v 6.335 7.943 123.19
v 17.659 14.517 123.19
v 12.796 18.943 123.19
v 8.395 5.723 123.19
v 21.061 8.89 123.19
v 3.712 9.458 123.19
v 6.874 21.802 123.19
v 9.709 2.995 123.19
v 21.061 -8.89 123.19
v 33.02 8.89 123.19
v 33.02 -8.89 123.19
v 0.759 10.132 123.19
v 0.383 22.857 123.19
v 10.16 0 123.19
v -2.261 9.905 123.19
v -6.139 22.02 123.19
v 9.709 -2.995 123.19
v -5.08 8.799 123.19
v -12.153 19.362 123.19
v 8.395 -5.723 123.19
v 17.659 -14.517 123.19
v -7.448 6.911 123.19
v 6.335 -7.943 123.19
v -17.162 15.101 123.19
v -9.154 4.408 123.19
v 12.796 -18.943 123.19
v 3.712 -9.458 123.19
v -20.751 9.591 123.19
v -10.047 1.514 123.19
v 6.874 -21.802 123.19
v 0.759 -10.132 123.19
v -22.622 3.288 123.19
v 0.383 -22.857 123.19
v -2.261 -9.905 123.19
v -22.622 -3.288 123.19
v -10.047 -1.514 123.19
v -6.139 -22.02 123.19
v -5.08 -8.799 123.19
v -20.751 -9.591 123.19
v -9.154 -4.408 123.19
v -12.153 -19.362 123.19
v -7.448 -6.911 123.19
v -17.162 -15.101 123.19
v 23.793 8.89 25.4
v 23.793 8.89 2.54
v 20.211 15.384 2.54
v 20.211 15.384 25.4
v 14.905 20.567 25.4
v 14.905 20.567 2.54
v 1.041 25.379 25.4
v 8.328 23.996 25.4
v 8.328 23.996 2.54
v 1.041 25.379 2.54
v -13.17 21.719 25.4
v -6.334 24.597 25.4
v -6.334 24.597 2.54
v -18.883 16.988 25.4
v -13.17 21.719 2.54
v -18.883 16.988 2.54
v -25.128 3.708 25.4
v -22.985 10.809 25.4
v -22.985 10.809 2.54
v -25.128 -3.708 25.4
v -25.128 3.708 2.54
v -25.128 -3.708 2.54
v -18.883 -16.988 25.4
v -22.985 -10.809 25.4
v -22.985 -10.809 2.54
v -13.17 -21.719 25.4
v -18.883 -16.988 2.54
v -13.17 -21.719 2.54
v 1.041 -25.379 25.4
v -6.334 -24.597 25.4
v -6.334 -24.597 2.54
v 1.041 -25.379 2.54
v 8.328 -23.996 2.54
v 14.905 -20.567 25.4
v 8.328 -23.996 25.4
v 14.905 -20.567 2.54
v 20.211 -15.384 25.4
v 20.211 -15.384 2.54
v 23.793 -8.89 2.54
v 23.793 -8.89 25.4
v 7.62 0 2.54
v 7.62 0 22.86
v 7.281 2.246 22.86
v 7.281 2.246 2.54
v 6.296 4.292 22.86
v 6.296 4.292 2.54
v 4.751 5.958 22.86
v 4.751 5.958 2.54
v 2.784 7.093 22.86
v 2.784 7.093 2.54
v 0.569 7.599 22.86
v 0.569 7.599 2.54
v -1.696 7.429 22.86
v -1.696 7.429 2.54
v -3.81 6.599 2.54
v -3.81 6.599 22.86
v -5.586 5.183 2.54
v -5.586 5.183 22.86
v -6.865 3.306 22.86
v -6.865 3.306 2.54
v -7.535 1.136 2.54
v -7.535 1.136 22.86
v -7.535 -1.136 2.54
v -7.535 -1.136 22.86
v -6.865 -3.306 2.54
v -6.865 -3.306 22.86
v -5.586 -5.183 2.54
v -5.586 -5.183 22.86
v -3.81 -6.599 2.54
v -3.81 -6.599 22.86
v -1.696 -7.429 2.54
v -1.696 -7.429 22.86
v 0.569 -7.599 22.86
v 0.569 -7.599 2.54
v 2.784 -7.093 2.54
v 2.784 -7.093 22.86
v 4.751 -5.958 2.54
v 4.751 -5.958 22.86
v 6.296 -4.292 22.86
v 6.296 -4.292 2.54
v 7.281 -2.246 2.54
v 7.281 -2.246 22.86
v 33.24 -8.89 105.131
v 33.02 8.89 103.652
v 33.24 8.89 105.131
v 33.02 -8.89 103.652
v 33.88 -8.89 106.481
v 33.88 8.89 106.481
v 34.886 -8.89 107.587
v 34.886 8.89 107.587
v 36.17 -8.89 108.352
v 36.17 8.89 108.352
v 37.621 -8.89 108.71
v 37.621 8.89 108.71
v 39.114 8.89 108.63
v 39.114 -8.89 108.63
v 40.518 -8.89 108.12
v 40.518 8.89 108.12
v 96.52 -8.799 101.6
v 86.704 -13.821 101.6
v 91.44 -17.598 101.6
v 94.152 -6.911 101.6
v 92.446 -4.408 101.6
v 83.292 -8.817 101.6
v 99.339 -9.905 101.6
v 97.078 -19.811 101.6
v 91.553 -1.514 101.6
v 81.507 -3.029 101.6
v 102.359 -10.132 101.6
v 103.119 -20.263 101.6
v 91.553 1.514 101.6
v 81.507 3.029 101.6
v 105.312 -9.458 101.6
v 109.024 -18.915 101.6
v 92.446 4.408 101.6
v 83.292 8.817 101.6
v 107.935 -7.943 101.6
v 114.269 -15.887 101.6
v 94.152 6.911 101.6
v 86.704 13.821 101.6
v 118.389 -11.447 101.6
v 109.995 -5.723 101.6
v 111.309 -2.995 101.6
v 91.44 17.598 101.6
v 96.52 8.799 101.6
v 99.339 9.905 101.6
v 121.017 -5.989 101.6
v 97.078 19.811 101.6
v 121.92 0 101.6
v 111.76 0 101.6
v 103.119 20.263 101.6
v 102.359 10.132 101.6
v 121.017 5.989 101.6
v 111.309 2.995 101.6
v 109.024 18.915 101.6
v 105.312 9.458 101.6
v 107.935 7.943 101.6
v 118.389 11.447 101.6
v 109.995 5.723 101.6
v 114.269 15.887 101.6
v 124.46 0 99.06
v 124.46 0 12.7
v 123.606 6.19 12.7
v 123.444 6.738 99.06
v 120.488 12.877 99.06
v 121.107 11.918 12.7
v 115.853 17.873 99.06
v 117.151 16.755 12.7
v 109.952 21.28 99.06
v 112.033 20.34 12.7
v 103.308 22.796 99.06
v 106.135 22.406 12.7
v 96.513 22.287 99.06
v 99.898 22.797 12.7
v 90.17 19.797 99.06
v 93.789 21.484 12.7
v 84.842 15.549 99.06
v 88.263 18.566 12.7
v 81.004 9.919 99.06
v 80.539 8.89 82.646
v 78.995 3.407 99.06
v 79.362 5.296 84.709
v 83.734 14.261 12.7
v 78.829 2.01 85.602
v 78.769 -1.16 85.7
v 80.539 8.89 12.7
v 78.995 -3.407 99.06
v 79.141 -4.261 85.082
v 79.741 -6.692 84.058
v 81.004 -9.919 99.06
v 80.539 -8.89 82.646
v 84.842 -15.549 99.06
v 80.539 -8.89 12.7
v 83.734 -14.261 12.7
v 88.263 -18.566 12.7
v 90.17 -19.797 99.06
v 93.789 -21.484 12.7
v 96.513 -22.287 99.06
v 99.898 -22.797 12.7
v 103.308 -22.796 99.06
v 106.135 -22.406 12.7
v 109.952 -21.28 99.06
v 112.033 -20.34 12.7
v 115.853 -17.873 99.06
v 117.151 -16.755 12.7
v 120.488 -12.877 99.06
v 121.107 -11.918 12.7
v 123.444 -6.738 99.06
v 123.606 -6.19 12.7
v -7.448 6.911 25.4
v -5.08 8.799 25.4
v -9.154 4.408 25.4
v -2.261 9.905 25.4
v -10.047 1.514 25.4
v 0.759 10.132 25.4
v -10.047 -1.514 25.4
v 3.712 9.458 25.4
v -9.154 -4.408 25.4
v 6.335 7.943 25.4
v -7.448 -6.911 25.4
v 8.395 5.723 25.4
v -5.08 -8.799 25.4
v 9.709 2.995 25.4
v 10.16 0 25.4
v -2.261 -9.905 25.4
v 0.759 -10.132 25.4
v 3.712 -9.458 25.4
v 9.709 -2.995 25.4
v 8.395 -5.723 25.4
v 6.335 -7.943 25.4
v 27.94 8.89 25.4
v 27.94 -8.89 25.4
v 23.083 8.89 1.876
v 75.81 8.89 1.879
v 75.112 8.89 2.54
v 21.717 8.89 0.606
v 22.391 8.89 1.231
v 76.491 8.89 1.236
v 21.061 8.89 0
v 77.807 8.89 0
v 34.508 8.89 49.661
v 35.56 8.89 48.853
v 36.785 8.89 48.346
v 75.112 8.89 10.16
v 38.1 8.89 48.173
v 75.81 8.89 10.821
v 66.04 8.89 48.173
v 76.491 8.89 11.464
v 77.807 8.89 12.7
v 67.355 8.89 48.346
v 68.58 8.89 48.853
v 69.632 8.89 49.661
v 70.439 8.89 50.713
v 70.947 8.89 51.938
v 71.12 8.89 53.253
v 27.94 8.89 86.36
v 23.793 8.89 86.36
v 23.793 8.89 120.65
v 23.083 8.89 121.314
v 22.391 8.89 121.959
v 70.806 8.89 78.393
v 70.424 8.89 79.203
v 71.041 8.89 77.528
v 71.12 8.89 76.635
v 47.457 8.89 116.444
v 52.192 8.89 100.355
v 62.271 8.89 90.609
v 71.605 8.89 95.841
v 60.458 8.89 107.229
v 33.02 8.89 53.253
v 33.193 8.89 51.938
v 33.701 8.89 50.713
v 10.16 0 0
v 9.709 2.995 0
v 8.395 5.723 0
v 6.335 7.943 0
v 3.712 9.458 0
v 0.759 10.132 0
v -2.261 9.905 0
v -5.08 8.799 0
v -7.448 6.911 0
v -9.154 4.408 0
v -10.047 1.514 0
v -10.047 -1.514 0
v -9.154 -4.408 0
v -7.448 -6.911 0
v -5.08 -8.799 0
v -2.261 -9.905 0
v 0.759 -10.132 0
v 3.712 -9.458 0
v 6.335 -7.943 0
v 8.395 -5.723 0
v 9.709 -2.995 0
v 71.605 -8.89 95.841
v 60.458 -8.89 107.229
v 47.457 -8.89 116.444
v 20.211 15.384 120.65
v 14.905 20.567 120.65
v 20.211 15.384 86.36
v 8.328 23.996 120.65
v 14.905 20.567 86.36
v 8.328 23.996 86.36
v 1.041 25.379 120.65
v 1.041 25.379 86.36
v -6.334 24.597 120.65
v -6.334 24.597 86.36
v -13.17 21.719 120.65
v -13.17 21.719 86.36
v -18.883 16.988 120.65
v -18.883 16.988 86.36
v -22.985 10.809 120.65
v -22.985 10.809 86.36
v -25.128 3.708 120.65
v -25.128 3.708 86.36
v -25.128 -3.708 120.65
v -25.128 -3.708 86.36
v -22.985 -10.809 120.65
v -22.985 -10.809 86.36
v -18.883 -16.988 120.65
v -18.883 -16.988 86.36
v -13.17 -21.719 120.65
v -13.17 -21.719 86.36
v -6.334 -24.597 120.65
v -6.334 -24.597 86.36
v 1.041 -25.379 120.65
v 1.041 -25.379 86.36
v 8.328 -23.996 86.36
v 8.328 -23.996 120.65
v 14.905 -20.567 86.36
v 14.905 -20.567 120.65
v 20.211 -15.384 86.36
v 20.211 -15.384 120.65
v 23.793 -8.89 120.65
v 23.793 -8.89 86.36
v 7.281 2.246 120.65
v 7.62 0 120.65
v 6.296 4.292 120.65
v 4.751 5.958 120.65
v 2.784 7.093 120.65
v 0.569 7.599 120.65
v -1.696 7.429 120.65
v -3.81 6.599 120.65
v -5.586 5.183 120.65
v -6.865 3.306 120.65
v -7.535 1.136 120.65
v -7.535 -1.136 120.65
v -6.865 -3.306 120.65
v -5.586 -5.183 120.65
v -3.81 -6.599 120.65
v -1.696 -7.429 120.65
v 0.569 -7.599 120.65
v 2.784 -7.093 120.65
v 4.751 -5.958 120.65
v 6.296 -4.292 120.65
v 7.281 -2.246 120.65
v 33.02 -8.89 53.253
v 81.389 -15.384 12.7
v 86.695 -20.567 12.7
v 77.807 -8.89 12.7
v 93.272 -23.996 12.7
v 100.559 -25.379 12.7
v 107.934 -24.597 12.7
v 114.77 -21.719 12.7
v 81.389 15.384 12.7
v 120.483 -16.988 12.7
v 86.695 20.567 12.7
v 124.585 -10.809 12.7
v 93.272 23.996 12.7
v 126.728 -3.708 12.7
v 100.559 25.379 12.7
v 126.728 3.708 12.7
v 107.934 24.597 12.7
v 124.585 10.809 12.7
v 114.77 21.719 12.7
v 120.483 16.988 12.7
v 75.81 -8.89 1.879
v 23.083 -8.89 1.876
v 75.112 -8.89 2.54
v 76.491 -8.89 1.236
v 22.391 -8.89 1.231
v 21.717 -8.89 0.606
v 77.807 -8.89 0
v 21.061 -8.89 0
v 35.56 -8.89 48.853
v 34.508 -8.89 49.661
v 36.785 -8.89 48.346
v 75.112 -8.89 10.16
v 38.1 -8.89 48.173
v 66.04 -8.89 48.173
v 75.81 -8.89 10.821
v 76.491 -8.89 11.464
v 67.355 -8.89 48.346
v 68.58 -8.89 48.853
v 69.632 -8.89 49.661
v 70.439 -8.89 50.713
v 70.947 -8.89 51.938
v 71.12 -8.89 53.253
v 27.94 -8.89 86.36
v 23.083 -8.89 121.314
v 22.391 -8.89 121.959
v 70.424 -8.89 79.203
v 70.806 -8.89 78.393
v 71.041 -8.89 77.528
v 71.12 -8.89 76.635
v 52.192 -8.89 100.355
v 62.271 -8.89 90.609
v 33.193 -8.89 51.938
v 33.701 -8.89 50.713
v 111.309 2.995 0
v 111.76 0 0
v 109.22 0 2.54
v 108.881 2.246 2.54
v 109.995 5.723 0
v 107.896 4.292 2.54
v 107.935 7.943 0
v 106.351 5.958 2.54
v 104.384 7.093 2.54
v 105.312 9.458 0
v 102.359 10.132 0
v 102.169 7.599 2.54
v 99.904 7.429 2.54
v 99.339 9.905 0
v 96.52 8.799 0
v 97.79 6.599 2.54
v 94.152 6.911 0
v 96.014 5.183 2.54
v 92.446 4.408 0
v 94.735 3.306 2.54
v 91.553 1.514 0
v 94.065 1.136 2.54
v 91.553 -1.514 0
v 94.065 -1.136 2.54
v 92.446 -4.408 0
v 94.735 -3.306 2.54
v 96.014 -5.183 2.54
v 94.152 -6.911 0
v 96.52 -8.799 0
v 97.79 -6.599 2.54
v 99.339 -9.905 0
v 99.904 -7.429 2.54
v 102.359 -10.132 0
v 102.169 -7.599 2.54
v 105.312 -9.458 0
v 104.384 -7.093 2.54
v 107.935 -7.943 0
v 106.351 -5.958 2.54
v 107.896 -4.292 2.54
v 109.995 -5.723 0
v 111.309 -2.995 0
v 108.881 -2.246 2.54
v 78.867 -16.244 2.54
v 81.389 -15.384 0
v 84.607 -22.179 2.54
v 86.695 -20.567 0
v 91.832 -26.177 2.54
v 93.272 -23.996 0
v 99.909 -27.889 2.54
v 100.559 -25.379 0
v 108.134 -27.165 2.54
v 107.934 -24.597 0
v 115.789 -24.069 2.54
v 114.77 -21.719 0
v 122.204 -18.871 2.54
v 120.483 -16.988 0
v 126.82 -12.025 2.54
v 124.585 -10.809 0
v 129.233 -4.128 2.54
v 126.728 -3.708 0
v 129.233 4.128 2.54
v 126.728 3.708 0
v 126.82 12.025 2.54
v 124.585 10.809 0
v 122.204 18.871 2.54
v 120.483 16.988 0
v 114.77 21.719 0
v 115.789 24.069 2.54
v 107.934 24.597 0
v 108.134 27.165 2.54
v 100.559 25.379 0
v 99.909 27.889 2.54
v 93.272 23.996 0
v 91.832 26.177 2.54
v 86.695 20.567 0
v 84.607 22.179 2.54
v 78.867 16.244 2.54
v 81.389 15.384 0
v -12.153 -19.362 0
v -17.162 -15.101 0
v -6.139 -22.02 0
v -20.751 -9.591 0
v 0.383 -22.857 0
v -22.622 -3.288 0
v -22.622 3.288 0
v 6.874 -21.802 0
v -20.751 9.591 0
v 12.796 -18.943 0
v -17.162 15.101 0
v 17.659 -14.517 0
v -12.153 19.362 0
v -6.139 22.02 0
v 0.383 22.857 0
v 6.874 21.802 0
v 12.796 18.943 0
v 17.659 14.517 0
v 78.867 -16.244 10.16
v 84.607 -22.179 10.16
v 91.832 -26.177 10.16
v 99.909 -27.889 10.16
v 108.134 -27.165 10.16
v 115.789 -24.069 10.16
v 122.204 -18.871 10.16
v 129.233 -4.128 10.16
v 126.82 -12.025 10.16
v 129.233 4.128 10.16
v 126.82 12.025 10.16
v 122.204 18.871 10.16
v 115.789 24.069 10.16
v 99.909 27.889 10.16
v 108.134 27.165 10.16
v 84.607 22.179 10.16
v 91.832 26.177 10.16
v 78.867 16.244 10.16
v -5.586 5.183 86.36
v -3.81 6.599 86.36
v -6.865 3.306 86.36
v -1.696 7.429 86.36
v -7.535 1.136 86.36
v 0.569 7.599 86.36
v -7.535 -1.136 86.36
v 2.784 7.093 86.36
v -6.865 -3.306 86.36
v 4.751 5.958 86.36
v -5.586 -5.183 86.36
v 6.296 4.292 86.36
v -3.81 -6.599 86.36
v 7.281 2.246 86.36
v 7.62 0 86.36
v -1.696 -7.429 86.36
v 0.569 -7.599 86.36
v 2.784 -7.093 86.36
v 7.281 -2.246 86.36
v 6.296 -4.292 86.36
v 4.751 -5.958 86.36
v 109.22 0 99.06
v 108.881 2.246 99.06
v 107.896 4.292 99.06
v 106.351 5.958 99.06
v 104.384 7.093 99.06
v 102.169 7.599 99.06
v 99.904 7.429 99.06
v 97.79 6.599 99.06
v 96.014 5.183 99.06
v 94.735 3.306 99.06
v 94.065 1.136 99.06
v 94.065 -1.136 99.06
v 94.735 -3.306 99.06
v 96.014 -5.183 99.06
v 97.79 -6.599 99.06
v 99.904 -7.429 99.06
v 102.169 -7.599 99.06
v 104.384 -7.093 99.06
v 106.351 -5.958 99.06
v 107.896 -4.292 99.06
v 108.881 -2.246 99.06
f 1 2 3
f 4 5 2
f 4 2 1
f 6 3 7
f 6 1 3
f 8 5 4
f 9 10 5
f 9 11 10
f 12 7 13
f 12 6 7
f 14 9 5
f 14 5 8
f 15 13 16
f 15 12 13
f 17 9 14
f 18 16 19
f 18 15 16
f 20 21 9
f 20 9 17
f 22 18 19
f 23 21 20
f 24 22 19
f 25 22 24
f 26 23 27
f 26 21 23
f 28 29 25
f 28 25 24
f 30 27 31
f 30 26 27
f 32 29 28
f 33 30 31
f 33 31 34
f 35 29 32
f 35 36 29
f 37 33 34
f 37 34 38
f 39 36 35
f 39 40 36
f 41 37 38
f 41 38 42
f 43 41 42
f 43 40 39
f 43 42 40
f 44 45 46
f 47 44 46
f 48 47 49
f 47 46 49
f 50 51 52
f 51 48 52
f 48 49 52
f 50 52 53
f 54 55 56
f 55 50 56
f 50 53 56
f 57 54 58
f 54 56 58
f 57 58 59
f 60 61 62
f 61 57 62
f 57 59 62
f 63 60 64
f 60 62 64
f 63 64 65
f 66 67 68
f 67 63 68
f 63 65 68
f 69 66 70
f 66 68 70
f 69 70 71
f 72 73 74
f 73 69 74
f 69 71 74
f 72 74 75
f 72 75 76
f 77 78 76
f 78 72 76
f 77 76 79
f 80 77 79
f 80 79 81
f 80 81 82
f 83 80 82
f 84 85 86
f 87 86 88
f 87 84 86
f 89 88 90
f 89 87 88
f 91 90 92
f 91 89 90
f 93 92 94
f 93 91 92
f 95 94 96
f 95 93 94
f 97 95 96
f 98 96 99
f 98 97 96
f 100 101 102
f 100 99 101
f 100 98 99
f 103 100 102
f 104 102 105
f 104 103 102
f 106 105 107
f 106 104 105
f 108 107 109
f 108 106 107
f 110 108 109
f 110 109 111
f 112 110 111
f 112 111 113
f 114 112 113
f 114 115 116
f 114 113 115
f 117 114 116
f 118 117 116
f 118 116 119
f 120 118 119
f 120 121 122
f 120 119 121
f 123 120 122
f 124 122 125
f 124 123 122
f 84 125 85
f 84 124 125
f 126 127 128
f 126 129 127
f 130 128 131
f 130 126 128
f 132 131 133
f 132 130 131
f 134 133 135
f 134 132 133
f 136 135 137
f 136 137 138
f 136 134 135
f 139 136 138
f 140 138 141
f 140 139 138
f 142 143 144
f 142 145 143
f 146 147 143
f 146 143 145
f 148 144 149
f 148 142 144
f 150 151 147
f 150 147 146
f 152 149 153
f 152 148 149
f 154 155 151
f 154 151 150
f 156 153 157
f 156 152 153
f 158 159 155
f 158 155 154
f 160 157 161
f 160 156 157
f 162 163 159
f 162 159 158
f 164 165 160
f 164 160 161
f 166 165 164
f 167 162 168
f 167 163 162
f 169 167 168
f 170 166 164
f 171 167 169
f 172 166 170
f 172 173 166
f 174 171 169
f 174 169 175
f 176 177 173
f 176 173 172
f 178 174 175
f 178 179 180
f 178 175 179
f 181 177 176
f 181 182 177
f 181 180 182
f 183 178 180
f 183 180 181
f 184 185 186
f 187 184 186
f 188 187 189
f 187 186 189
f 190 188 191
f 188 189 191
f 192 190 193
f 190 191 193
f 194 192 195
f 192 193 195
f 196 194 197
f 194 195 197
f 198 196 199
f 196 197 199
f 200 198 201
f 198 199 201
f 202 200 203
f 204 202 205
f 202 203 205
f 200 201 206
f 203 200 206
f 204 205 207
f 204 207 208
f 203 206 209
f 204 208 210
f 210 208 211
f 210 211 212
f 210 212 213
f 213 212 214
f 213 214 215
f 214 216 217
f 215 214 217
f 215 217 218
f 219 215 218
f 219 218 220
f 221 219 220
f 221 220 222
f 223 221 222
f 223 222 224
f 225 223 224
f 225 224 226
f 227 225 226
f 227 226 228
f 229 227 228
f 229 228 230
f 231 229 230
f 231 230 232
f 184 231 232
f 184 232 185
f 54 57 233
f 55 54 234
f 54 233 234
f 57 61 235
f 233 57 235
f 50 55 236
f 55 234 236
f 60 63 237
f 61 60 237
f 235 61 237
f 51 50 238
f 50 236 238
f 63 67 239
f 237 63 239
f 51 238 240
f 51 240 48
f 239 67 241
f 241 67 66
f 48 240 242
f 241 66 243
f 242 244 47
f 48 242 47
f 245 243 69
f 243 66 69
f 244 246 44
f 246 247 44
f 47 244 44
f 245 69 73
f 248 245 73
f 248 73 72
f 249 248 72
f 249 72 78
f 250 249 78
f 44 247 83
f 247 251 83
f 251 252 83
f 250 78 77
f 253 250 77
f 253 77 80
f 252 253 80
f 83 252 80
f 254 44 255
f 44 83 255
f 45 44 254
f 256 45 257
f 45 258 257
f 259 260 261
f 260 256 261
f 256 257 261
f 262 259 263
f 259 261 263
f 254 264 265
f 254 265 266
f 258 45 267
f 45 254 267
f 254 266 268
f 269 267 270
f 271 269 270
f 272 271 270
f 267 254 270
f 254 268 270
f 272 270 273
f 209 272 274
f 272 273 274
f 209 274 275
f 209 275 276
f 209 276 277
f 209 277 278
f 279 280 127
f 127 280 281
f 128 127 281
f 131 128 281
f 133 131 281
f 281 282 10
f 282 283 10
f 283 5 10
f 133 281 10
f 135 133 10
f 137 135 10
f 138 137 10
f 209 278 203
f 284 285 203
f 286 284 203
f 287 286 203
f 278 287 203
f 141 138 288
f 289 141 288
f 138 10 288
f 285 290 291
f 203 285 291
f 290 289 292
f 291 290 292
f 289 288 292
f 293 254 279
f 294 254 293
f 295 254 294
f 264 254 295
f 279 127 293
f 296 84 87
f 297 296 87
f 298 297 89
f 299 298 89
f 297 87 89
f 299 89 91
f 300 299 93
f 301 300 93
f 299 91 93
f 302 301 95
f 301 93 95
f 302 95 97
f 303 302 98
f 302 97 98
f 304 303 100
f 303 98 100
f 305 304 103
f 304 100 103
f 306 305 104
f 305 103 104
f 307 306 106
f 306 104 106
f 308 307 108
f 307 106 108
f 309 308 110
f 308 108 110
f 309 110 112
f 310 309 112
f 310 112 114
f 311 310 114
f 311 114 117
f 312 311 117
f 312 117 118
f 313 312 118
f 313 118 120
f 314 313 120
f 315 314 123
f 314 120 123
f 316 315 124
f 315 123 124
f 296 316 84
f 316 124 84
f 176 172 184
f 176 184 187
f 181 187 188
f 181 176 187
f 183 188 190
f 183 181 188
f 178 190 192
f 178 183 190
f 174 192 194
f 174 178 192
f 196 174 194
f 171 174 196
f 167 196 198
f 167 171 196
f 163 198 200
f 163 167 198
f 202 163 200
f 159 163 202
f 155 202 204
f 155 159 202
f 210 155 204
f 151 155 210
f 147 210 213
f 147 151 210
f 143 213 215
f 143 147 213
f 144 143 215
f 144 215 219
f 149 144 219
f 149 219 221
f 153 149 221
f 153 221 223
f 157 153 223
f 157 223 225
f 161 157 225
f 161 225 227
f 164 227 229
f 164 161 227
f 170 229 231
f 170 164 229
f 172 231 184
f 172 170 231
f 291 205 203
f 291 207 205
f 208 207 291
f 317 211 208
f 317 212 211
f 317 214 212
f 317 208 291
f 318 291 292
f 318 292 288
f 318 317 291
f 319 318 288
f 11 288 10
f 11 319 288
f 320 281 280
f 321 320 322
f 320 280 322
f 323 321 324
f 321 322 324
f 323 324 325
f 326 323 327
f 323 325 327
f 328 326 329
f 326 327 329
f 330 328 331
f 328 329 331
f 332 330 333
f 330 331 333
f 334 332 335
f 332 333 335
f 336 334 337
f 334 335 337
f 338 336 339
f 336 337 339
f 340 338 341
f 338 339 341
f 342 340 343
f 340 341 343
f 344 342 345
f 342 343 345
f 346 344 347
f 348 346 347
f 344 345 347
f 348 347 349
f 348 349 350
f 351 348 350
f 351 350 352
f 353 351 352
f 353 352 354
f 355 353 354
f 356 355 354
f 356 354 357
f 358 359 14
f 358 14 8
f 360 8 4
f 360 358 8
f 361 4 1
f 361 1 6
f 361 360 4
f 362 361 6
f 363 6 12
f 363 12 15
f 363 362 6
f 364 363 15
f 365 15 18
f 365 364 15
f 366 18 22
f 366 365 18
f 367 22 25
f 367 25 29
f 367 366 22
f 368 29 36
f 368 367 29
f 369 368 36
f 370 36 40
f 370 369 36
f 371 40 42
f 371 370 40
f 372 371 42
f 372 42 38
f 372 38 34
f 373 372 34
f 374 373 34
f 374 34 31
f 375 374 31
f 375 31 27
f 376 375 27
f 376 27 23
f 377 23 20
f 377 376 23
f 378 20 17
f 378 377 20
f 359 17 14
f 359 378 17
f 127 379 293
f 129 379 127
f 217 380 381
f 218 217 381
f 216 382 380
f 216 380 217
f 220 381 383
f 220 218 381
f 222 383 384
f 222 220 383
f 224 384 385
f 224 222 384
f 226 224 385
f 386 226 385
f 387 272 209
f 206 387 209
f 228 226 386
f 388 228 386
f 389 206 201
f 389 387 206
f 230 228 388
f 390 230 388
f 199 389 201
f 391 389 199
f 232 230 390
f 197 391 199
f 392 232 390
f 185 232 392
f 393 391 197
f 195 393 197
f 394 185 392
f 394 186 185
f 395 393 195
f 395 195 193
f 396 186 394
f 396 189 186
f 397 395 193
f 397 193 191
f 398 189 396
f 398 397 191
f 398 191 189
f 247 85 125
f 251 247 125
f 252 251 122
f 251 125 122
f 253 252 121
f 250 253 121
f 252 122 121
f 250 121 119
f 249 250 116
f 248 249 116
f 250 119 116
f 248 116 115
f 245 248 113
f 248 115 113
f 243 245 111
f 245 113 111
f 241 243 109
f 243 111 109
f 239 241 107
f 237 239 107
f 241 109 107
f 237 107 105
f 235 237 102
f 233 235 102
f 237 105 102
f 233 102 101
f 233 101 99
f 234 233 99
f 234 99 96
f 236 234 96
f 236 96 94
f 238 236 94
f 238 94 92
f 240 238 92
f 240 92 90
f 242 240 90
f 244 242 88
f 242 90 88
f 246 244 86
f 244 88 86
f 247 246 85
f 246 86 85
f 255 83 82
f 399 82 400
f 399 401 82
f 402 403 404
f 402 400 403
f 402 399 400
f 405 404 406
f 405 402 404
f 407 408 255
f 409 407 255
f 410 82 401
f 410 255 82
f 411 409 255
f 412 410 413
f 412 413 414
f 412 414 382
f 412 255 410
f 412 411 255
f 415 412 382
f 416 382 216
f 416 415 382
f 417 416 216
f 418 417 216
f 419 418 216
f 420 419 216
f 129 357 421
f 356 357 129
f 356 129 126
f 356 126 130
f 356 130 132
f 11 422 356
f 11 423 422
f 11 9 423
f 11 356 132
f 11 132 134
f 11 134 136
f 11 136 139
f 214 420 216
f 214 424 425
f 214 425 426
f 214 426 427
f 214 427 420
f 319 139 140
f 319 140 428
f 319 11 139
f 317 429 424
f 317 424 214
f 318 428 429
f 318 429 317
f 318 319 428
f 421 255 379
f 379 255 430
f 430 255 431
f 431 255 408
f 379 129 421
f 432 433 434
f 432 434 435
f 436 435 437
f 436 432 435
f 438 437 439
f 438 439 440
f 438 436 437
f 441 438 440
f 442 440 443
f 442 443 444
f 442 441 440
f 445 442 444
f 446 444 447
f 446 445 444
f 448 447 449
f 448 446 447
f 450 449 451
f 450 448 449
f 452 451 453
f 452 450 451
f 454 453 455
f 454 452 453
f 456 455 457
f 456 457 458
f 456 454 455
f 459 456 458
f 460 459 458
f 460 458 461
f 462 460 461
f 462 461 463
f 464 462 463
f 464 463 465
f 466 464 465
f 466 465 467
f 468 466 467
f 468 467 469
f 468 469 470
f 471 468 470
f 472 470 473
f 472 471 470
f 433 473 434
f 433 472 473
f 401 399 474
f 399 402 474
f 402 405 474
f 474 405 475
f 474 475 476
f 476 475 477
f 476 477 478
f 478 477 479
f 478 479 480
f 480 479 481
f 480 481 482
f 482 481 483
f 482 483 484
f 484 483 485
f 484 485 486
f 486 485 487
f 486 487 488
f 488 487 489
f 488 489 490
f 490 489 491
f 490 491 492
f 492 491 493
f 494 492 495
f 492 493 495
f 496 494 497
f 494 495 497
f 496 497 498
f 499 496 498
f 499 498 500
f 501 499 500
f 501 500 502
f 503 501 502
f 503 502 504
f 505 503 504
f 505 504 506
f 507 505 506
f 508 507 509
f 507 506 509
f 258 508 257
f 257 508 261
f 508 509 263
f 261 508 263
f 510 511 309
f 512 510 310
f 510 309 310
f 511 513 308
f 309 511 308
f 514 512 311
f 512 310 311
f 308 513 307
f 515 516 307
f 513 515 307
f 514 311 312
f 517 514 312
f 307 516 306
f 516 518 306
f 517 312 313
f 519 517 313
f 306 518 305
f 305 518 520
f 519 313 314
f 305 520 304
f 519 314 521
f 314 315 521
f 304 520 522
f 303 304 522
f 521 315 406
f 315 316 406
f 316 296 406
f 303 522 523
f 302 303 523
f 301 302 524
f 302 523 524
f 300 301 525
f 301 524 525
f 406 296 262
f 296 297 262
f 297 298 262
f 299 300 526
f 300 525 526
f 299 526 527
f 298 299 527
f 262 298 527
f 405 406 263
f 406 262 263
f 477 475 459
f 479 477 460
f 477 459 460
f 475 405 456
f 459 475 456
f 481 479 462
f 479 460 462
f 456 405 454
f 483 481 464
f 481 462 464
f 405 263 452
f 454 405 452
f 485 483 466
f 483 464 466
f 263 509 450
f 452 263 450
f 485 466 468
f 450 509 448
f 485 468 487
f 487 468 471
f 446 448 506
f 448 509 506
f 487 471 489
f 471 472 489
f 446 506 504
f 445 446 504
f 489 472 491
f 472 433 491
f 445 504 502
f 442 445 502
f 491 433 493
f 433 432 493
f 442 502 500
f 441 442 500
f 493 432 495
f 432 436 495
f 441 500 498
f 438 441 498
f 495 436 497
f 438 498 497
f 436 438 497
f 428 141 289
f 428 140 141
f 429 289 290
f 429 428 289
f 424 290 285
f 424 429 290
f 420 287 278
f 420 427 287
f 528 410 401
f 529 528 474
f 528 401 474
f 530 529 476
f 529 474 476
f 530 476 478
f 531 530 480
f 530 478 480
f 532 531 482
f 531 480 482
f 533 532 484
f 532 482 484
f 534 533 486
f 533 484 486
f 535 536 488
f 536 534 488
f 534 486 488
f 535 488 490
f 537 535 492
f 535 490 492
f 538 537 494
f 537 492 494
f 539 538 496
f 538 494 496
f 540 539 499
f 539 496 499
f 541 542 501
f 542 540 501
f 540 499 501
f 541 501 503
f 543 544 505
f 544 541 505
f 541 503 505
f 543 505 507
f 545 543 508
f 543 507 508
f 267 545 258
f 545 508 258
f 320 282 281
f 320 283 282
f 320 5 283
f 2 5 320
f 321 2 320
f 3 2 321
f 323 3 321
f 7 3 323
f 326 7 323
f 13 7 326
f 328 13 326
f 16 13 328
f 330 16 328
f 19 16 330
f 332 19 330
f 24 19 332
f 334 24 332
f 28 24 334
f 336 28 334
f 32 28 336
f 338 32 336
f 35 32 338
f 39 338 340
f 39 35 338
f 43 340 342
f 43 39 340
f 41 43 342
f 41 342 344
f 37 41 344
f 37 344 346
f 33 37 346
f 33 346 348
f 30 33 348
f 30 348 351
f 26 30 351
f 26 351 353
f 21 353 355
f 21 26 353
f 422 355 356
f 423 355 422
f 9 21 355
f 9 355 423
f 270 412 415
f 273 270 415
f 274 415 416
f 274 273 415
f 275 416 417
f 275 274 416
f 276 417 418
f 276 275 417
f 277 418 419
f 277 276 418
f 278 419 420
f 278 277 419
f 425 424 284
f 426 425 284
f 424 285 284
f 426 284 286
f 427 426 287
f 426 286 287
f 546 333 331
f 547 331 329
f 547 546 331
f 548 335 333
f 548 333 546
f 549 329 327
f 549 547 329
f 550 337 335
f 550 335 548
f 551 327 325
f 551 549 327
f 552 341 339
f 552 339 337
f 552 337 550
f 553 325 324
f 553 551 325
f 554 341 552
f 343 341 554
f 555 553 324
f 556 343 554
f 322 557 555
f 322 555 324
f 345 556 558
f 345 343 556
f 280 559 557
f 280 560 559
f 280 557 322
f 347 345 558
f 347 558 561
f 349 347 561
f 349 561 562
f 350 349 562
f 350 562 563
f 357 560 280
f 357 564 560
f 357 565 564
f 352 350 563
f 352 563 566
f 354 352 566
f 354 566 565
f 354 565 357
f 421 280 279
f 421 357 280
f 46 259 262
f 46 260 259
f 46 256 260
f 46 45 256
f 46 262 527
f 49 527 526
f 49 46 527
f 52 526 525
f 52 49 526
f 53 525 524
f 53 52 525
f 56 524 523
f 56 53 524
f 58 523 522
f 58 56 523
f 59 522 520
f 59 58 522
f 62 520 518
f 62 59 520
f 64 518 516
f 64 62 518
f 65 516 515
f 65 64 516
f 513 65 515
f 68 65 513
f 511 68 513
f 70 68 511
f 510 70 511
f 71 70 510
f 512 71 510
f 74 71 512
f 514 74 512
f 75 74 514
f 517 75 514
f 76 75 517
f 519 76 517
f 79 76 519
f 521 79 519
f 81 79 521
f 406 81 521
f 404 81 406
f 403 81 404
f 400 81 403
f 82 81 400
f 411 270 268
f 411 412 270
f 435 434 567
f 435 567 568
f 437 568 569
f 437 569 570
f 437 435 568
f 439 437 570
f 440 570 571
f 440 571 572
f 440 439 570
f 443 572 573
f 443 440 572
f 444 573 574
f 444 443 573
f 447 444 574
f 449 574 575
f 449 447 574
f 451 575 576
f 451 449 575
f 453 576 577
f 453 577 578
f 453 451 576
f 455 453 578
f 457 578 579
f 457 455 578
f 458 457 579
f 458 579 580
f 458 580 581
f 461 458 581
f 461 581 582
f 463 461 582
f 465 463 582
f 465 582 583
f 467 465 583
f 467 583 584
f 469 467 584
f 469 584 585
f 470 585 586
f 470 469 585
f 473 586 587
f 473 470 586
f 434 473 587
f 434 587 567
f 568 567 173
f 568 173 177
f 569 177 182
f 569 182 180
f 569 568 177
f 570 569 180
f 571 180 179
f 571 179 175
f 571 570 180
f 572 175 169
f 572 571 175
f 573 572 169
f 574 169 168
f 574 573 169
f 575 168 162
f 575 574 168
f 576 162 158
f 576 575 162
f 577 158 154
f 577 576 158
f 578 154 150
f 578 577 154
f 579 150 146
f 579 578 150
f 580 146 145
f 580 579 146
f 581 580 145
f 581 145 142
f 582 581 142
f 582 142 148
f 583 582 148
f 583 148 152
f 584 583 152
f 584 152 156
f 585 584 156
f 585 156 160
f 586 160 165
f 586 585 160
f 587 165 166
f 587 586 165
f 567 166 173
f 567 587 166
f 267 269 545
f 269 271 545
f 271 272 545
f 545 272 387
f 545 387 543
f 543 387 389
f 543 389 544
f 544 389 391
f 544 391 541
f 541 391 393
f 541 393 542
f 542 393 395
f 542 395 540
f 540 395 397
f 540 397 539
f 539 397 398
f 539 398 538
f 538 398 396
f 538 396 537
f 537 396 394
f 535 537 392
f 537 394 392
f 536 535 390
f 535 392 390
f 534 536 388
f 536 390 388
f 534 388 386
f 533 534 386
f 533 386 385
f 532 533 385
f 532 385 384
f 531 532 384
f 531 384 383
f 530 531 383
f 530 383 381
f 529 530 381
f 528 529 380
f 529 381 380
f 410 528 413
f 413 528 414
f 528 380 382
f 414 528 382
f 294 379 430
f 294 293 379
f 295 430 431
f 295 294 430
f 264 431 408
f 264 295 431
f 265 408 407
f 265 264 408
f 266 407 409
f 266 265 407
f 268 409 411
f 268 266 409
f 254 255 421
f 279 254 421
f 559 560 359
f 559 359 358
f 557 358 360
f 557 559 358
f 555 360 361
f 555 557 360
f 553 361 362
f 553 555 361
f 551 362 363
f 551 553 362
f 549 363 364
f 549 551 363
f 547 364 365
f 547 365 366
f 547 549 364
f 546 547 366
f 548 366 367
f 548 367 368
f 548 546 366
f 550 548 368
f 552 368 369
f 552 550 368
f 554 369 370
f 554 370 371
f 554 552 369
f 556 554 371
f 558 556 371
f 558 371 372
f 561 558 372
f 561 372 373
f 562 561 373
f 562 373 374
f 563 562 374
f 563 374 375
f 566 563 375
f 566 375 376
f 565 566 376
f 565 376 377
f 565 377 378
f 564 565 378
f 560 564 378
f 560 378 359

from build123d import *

# Parameters (mm, degrees)
F0_R      = 25.4
F0_R_2    = 7.62
F1_DEPTH  = 123.19
F0_R_3    = 22.86
F3_DEPTH  = 101.6
F5_DEPTH  = 8.89
F6_W      = 60.96
F6_H      = 60.96
F7_DEPTH  = 50.8
F8_R      = 5.08
F9_SIZE   = 2.54
F10_R     = 27.94
F10_R_2   = 22.86
F11_DEPTH = 12.7
F12_SIZE  = 2.54


with BuildPart() as f1:
    # F0 (on Top) → F1 (new body)
    with BuildSketch(Plane.XY):
        Circle(F0_R)
        Circle(F0_R_2, mode=Mode.SUBTRACT)
    extrude(amount=F1_DEPTH)



with BuildPart() as f3:
    # F0 (on Top) → F3 (new body)
    with BuildSketch(Plane.XY):
        with Locations((101.6, 0)):
            Circle(F0_R_3)
        with Locations((101.6, 0)):
            Circle(F0_R_2, mode=Mode.SUBTRACT)
    extrude(amount=F3_DEPTH)


with BuildPart() as f1_1:
    add(f1.part)

    add(f3.part)  # F5 merges F3
    # F4 (on Front) → F5 (join, symmetric)
    with BuildSketch(Plane.XZ):
        with BuildLine():
            Line((20.32, 123.19), (20.32, 0))
            Line((20.32, 0), (81.28, 0))
            Line((81.28, 0), (81.28, 81.28))
            ThreePointArc((81.28, 81.28), (61.0468357955, 106.7222654615), (33.02, 123.19))
            Line((33.02, 123.19), (20.32, 123.19))
        make_face()
        with BuildLine():
            ThreePointArc((33.02, 111.6727406383), (54.9192892431, 98.053343988), (71.12, 77.988354443))
            Line((71.12, 77.988354443), (71.12, 48.1727406383))
            Line((71.12, 48.1727406383), (33.02, 48.1727406383))
            Line((33.02, 48.1727406383), (33.02, 111.6727406383))
        make_face(mode=Mode.SUBTRACT)
    extrude(amount=F5_DEPTH, both=True)

    # F6 (on Front) → F7 (cut, symmetric)
    with BuildSketch(Plane.XZ):
        with Locations((-2.54, 55.88)):
            Rectangle(F6_W, F6_H)
    extrude(amount=F7_DEPTH, both=True, mode=Mode.SUBTRACT)

    # F8
    f8_edges = [f1_1.edges().sort_by_distance(p)[0] for p in [
        (33.02, 0, 111.672741),
        (71.12, 0, 77.988354),
        (33.02, 0, 48.172741),
        (71.12, 0, 48.172741),
    ]]
    fillet(f8_edges, radius=F8_R)

    # F9
    f9_edges = [f1_1.edges().sort_by_distance(p)[0] for p in [
        (-7.62, 0, 123.19),
        (-25.4, 0, 123.19),
        (-7.62, 0, 25.4),
        (-7.62, 0, 0),
        (-25.4, 0, 0),
    ]]
    chamfer(f9_edges, length=F9_SIZE)

    # F10 (on Top) → F11 (join)
    with BuildSketch(Plane.XY):
        with Locations((101.6, 0)):
            Circle(F10_R)
        with Locations((101.6, 0)):
            Circle(F10_R_2, mode=Mode.SUBTRACT)
    extrude(amount=F11_DEPTH)

    # F12
    f12_edges = [f1_1.edges().sort_by_distance(p)[0] for p in [
        (93.98, 0, 0),
        (129.54, 0, 0),
        (93.98, 0, 101.6),
        (129.54, 0, 12.7),
        (78.74, 0, 101.6),
    ]]
    chamfer(f12_edges, length=F12_SIZE)


solid = f1_1.part
